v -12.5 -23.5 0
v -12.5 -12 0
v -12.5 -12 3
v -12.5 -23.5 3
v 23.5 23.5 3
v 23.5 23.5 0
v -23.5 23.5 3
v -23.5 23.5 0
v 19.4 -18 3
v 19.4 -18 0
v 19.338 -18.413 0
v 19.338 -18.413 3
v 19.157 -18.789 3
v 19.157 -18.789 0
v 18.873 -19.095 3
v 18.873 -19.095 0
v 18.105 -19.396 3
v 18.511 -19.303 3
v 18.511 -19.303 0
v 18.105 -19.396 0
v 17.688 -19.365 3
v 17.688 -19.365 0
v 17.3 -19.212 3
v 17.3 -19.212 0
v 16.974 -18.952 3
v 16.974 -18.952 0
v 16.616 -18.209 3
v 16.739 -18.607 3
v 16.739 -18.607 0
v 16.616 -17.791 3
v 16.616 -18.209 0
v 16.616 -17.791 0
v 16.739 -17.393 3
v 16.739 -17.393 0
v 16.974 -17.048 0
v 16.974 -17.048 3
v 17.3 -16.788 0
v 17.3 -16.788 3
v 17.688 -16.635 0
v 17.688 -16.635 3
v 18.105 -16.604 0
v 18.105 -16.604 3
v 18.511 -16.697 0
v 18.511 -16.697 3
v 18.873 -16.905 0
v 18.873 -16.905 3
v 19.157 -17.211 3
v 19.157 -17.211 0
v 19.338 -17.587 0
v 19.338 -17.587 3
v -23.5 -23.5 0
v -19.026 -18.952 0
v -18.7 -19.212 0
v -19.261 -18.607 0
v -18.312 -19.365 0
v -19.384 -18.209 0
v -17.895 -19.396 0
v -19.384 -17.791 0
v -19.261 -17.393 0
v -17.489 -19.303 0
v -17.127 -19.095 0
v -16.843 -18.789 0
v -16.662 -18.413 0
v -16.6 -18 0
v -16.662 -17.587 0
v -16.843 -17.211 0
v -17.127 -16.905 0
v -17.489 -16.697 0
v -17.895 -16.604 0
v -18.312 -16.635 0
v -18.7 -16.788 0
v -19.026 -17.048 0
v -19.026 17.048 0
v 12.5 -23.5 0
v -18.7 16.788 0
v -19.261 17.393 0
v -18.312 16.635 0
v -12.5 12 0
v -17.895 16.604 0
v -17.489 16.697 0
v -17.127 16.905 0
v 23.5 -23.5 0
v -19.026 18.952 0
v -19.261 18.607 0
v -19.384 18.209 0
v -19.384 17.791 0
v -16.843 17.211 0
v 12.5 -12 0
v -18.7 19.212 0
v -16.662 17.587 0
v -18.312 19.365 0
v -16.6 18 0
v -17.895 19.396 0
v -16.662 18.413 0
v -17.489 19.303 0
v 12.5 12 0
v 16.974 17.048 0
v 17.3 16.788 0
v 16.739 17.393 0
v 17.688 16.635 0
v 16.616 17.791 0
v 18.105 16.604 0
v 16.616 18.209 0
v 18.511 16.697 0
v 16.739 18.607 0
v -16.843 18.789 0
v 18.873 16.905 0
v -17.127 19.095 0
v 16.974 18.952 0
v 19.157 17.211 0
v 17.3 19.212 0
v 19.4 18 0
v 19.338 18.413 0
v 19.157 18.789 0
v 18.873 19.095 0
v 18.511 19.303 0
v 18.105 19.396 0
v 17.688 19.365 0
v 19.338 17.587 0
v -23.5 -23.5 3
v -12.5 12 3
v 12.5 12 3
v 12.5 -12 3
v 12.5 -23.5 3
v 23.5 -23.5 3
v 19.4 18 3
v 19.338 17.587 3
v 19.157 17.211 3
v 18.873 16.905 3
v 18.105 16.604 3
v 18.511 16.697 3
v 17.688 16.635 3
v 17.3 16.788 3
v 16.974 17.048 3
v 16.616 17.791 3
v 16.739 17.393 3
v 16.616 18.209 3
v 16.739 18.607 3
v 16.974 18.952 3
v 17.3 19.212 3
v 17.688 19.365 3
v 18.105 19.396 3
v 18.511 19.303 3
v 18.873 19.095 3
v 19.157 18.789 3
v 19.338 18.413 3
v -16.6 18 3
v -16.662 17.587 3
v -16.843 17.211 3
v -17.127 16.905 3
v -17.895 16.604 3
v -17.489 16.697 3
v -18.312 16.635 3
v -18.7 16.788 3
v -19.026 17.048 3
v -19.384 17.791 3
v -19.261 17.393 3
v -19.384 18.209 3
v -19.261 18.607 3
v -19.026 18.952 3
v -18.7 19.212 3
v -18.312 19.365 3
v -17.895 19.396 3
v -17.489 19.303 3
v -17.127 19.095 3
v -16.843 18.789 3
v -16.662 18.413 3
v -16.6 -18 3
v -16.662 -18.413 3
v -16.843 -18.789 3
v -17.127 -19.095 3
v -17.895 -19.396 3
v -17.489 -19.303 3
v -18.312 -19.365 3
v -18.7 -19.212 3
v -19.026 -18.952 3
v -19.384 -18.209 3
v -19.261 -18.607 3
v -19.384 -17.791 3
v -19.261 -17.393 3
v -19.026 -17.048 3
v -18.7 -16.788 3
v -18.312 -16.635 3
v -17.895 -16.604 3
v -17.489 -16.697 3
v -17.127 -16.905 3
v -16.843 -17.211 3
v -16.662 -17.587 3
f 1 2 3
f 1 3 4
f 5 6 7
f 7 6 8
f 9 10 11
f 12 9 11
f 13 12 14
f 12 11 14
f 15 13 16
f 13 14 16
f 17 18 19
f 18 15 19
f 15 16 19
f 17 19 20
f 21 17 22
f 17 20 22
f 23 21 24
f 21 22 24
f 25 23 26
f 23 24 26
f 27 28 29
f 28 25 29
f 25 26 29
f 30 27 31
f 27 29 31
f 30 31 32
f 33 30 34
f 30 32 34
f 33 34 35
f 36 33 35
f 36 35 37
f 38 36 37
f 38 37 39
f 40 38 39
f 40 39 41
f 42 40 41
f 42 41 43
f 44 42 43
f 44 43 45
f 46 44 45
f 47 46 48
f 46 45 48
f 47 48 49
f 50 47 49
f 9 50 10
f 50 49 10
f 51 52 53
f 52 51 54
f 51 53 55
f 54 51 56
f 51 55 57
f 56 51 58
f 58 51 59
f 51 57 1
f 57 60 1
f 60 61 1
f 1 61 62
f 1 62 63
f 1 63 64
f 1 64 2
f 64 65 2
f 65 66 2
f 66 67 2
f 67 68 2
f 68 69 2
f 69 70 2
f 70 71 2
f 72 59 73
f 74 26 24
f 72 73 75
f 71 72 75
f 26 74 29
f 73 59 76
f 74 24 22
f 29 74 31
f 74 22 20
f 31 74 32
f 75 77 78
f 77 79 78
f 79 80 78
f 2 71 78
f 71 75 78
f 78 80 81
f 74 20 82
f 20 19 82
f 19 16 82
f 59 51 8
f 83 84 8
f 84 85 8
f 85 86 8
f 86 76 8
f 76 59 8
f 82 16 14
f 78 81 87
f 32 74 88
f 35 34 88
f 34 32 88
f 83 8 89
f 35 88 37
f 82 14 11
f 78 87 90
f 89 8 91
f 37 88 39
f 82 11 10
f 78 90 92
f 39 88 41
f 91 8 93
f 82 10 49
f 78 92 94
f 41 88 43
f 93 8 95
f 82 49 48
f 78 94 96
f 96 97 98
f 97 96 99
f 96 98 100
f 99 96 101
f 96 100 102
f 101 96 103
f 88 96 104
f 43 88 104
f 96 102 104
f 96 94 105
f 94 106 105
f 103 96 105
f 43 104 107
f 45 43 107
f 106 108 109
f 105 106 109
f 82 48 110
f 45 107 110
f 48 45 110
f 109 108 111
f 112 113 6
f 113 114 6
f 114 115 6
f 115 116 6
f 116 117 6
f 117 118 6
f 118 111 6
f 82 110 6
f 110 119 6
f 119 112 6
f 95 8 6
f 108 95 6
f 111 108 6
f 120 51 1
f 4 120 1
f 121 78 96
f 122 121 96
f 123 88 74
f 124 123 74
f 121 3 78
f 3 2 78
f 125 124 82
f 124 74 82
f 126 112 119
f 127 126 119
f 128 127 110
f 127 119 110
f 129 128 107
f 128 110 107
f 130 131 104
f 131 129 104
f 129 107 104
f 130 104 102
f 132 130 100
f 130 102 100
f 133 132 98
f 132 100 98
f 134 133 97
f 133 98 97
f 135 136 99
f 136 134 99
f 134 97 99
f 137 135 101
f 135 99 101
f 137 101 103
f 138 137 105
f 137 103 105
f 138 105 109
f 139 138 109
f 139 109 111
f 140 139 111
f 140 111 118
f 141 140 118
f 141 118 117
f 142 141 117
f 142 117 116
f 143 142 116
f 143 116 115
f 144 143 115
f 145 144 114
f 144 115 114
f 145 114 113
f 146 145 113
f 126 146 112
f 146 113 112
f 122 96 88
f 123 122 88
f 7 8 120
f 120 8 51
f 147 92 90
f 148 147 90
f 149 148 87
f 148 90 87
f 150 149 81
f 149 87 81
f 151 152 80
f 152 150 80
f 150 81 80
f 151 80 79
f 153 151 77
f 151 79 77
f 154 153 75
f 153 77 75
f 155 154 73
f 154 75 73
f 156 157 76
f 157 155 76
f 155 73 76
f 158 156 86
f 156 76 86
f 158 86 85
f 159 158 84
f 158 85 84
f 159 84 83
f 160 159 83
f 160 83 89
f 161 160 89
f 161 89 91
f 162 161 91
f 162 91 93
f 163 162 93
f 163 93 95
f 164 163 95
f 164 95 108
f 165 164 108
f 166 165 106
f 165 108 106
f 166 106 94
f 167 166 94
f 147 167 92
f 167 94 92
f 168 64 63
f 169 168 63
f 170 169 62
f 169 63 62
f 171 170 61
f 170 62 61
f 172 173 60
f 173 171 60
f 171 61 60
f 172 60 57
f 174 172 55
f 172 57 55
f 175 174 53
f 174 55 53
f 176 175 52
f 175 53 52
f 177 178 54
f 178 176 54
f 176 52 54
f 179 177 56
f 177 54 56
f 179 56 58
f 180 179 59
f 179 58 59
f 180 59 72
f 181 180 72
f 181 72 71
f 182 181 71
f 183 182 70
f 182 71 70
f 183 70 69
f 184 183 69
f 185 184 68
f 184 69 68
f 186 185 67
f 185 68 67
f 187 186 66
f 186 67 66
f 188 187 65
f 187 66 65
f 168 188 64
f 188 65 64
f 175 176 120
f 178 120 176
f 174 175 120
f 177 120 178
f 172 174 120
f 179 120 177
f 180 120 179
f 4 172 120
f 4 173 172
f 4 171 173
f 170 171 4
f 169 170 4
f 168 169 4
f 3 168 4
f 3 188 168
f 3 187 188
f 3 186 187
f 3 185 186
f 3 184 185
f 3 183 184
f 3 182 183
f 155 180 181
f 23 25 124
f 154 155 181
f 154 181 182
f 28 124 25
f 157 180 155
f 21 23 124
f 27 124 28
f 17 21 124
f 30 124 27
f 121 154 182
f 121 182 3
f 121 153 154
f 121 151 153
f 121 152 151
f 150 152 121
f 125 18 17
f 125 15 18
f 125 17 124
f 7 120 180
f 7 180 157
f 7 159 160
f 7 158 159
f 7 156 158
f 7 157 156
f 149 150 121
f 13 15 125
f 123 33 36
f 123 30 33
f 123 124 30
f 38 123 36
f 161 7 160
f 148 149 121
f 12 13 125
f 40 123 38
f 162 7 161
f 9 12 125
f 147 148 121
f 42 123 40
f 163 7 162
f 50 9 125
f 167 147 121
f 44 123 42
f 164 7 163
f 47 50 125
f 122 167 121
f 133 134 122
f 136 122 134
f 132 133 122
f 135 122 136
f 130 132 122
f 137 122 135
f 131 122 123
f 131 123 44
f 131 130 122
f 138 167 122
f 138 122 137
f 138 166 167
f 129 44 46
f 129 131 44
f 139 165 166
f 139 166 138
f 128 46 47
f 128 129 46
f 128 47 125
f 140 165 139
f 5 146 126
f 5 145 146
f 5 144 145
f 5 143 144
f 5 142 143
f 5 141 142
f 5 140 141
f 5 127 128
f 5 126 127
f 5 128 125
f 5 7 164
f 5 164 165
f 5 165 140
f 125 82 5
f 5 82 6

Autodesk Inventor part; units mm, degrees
ref_plane "YZ Plane" through (0, 0, 0) normal (1, 0, 0) x (0, 1, 0)
ref_plane "XZ Plane" through (0, 0, 0) normal (0, 1, 0) x (-1, 0, 0)
ref_plane "XY Plane" through (0, 0, 0) normal (0, 0, 1) x (1, 0, 0)
sketch "Sketch1" plane through (0, 0, 0) normal (0, 0, 1) x (1, 0, 0)
  line L0 (-23.5, 23.5) -> (-23.5, -23.5) projected
  line L1 (23.5, 23.5) -> (-23.5, 23.5) projected
  line L2 (23.5, -23.5) -> (23.5, 23.5) projected
  line L3 (-23.5, -23.5) -> (23.5, -23.5) projected
  circle A0 centre (-18, -18) radius 1.4 projected
  circle A1 centre (-18, 18) radius 1.4 projected
  circle A2 centre (18, 18) radius 1.4 projected
  circle A3 centre (18, -18) radius 1.4 projected
  line L4 (12.5, 12) -> (12.5, -12) projected
  line L5 (-12.5, -12) -> (-12.5, 12) projected
  line L6 (-12.5, 12) -> (12.5, 12) projected
  line L7 (12.5, -12) -> (12.5, -23.5)
  line L8 (-12.5, -12) -> (-12.5, -23.5)
  point P0 (0, 0)
extrude "Extrusion1" add sketch "Sketch1" along normal blind 3 contours L1 L2 L3 L7 L4 L6 L5 L8 L0
properties part number "Camera-Holder_Mount-Bottom"
